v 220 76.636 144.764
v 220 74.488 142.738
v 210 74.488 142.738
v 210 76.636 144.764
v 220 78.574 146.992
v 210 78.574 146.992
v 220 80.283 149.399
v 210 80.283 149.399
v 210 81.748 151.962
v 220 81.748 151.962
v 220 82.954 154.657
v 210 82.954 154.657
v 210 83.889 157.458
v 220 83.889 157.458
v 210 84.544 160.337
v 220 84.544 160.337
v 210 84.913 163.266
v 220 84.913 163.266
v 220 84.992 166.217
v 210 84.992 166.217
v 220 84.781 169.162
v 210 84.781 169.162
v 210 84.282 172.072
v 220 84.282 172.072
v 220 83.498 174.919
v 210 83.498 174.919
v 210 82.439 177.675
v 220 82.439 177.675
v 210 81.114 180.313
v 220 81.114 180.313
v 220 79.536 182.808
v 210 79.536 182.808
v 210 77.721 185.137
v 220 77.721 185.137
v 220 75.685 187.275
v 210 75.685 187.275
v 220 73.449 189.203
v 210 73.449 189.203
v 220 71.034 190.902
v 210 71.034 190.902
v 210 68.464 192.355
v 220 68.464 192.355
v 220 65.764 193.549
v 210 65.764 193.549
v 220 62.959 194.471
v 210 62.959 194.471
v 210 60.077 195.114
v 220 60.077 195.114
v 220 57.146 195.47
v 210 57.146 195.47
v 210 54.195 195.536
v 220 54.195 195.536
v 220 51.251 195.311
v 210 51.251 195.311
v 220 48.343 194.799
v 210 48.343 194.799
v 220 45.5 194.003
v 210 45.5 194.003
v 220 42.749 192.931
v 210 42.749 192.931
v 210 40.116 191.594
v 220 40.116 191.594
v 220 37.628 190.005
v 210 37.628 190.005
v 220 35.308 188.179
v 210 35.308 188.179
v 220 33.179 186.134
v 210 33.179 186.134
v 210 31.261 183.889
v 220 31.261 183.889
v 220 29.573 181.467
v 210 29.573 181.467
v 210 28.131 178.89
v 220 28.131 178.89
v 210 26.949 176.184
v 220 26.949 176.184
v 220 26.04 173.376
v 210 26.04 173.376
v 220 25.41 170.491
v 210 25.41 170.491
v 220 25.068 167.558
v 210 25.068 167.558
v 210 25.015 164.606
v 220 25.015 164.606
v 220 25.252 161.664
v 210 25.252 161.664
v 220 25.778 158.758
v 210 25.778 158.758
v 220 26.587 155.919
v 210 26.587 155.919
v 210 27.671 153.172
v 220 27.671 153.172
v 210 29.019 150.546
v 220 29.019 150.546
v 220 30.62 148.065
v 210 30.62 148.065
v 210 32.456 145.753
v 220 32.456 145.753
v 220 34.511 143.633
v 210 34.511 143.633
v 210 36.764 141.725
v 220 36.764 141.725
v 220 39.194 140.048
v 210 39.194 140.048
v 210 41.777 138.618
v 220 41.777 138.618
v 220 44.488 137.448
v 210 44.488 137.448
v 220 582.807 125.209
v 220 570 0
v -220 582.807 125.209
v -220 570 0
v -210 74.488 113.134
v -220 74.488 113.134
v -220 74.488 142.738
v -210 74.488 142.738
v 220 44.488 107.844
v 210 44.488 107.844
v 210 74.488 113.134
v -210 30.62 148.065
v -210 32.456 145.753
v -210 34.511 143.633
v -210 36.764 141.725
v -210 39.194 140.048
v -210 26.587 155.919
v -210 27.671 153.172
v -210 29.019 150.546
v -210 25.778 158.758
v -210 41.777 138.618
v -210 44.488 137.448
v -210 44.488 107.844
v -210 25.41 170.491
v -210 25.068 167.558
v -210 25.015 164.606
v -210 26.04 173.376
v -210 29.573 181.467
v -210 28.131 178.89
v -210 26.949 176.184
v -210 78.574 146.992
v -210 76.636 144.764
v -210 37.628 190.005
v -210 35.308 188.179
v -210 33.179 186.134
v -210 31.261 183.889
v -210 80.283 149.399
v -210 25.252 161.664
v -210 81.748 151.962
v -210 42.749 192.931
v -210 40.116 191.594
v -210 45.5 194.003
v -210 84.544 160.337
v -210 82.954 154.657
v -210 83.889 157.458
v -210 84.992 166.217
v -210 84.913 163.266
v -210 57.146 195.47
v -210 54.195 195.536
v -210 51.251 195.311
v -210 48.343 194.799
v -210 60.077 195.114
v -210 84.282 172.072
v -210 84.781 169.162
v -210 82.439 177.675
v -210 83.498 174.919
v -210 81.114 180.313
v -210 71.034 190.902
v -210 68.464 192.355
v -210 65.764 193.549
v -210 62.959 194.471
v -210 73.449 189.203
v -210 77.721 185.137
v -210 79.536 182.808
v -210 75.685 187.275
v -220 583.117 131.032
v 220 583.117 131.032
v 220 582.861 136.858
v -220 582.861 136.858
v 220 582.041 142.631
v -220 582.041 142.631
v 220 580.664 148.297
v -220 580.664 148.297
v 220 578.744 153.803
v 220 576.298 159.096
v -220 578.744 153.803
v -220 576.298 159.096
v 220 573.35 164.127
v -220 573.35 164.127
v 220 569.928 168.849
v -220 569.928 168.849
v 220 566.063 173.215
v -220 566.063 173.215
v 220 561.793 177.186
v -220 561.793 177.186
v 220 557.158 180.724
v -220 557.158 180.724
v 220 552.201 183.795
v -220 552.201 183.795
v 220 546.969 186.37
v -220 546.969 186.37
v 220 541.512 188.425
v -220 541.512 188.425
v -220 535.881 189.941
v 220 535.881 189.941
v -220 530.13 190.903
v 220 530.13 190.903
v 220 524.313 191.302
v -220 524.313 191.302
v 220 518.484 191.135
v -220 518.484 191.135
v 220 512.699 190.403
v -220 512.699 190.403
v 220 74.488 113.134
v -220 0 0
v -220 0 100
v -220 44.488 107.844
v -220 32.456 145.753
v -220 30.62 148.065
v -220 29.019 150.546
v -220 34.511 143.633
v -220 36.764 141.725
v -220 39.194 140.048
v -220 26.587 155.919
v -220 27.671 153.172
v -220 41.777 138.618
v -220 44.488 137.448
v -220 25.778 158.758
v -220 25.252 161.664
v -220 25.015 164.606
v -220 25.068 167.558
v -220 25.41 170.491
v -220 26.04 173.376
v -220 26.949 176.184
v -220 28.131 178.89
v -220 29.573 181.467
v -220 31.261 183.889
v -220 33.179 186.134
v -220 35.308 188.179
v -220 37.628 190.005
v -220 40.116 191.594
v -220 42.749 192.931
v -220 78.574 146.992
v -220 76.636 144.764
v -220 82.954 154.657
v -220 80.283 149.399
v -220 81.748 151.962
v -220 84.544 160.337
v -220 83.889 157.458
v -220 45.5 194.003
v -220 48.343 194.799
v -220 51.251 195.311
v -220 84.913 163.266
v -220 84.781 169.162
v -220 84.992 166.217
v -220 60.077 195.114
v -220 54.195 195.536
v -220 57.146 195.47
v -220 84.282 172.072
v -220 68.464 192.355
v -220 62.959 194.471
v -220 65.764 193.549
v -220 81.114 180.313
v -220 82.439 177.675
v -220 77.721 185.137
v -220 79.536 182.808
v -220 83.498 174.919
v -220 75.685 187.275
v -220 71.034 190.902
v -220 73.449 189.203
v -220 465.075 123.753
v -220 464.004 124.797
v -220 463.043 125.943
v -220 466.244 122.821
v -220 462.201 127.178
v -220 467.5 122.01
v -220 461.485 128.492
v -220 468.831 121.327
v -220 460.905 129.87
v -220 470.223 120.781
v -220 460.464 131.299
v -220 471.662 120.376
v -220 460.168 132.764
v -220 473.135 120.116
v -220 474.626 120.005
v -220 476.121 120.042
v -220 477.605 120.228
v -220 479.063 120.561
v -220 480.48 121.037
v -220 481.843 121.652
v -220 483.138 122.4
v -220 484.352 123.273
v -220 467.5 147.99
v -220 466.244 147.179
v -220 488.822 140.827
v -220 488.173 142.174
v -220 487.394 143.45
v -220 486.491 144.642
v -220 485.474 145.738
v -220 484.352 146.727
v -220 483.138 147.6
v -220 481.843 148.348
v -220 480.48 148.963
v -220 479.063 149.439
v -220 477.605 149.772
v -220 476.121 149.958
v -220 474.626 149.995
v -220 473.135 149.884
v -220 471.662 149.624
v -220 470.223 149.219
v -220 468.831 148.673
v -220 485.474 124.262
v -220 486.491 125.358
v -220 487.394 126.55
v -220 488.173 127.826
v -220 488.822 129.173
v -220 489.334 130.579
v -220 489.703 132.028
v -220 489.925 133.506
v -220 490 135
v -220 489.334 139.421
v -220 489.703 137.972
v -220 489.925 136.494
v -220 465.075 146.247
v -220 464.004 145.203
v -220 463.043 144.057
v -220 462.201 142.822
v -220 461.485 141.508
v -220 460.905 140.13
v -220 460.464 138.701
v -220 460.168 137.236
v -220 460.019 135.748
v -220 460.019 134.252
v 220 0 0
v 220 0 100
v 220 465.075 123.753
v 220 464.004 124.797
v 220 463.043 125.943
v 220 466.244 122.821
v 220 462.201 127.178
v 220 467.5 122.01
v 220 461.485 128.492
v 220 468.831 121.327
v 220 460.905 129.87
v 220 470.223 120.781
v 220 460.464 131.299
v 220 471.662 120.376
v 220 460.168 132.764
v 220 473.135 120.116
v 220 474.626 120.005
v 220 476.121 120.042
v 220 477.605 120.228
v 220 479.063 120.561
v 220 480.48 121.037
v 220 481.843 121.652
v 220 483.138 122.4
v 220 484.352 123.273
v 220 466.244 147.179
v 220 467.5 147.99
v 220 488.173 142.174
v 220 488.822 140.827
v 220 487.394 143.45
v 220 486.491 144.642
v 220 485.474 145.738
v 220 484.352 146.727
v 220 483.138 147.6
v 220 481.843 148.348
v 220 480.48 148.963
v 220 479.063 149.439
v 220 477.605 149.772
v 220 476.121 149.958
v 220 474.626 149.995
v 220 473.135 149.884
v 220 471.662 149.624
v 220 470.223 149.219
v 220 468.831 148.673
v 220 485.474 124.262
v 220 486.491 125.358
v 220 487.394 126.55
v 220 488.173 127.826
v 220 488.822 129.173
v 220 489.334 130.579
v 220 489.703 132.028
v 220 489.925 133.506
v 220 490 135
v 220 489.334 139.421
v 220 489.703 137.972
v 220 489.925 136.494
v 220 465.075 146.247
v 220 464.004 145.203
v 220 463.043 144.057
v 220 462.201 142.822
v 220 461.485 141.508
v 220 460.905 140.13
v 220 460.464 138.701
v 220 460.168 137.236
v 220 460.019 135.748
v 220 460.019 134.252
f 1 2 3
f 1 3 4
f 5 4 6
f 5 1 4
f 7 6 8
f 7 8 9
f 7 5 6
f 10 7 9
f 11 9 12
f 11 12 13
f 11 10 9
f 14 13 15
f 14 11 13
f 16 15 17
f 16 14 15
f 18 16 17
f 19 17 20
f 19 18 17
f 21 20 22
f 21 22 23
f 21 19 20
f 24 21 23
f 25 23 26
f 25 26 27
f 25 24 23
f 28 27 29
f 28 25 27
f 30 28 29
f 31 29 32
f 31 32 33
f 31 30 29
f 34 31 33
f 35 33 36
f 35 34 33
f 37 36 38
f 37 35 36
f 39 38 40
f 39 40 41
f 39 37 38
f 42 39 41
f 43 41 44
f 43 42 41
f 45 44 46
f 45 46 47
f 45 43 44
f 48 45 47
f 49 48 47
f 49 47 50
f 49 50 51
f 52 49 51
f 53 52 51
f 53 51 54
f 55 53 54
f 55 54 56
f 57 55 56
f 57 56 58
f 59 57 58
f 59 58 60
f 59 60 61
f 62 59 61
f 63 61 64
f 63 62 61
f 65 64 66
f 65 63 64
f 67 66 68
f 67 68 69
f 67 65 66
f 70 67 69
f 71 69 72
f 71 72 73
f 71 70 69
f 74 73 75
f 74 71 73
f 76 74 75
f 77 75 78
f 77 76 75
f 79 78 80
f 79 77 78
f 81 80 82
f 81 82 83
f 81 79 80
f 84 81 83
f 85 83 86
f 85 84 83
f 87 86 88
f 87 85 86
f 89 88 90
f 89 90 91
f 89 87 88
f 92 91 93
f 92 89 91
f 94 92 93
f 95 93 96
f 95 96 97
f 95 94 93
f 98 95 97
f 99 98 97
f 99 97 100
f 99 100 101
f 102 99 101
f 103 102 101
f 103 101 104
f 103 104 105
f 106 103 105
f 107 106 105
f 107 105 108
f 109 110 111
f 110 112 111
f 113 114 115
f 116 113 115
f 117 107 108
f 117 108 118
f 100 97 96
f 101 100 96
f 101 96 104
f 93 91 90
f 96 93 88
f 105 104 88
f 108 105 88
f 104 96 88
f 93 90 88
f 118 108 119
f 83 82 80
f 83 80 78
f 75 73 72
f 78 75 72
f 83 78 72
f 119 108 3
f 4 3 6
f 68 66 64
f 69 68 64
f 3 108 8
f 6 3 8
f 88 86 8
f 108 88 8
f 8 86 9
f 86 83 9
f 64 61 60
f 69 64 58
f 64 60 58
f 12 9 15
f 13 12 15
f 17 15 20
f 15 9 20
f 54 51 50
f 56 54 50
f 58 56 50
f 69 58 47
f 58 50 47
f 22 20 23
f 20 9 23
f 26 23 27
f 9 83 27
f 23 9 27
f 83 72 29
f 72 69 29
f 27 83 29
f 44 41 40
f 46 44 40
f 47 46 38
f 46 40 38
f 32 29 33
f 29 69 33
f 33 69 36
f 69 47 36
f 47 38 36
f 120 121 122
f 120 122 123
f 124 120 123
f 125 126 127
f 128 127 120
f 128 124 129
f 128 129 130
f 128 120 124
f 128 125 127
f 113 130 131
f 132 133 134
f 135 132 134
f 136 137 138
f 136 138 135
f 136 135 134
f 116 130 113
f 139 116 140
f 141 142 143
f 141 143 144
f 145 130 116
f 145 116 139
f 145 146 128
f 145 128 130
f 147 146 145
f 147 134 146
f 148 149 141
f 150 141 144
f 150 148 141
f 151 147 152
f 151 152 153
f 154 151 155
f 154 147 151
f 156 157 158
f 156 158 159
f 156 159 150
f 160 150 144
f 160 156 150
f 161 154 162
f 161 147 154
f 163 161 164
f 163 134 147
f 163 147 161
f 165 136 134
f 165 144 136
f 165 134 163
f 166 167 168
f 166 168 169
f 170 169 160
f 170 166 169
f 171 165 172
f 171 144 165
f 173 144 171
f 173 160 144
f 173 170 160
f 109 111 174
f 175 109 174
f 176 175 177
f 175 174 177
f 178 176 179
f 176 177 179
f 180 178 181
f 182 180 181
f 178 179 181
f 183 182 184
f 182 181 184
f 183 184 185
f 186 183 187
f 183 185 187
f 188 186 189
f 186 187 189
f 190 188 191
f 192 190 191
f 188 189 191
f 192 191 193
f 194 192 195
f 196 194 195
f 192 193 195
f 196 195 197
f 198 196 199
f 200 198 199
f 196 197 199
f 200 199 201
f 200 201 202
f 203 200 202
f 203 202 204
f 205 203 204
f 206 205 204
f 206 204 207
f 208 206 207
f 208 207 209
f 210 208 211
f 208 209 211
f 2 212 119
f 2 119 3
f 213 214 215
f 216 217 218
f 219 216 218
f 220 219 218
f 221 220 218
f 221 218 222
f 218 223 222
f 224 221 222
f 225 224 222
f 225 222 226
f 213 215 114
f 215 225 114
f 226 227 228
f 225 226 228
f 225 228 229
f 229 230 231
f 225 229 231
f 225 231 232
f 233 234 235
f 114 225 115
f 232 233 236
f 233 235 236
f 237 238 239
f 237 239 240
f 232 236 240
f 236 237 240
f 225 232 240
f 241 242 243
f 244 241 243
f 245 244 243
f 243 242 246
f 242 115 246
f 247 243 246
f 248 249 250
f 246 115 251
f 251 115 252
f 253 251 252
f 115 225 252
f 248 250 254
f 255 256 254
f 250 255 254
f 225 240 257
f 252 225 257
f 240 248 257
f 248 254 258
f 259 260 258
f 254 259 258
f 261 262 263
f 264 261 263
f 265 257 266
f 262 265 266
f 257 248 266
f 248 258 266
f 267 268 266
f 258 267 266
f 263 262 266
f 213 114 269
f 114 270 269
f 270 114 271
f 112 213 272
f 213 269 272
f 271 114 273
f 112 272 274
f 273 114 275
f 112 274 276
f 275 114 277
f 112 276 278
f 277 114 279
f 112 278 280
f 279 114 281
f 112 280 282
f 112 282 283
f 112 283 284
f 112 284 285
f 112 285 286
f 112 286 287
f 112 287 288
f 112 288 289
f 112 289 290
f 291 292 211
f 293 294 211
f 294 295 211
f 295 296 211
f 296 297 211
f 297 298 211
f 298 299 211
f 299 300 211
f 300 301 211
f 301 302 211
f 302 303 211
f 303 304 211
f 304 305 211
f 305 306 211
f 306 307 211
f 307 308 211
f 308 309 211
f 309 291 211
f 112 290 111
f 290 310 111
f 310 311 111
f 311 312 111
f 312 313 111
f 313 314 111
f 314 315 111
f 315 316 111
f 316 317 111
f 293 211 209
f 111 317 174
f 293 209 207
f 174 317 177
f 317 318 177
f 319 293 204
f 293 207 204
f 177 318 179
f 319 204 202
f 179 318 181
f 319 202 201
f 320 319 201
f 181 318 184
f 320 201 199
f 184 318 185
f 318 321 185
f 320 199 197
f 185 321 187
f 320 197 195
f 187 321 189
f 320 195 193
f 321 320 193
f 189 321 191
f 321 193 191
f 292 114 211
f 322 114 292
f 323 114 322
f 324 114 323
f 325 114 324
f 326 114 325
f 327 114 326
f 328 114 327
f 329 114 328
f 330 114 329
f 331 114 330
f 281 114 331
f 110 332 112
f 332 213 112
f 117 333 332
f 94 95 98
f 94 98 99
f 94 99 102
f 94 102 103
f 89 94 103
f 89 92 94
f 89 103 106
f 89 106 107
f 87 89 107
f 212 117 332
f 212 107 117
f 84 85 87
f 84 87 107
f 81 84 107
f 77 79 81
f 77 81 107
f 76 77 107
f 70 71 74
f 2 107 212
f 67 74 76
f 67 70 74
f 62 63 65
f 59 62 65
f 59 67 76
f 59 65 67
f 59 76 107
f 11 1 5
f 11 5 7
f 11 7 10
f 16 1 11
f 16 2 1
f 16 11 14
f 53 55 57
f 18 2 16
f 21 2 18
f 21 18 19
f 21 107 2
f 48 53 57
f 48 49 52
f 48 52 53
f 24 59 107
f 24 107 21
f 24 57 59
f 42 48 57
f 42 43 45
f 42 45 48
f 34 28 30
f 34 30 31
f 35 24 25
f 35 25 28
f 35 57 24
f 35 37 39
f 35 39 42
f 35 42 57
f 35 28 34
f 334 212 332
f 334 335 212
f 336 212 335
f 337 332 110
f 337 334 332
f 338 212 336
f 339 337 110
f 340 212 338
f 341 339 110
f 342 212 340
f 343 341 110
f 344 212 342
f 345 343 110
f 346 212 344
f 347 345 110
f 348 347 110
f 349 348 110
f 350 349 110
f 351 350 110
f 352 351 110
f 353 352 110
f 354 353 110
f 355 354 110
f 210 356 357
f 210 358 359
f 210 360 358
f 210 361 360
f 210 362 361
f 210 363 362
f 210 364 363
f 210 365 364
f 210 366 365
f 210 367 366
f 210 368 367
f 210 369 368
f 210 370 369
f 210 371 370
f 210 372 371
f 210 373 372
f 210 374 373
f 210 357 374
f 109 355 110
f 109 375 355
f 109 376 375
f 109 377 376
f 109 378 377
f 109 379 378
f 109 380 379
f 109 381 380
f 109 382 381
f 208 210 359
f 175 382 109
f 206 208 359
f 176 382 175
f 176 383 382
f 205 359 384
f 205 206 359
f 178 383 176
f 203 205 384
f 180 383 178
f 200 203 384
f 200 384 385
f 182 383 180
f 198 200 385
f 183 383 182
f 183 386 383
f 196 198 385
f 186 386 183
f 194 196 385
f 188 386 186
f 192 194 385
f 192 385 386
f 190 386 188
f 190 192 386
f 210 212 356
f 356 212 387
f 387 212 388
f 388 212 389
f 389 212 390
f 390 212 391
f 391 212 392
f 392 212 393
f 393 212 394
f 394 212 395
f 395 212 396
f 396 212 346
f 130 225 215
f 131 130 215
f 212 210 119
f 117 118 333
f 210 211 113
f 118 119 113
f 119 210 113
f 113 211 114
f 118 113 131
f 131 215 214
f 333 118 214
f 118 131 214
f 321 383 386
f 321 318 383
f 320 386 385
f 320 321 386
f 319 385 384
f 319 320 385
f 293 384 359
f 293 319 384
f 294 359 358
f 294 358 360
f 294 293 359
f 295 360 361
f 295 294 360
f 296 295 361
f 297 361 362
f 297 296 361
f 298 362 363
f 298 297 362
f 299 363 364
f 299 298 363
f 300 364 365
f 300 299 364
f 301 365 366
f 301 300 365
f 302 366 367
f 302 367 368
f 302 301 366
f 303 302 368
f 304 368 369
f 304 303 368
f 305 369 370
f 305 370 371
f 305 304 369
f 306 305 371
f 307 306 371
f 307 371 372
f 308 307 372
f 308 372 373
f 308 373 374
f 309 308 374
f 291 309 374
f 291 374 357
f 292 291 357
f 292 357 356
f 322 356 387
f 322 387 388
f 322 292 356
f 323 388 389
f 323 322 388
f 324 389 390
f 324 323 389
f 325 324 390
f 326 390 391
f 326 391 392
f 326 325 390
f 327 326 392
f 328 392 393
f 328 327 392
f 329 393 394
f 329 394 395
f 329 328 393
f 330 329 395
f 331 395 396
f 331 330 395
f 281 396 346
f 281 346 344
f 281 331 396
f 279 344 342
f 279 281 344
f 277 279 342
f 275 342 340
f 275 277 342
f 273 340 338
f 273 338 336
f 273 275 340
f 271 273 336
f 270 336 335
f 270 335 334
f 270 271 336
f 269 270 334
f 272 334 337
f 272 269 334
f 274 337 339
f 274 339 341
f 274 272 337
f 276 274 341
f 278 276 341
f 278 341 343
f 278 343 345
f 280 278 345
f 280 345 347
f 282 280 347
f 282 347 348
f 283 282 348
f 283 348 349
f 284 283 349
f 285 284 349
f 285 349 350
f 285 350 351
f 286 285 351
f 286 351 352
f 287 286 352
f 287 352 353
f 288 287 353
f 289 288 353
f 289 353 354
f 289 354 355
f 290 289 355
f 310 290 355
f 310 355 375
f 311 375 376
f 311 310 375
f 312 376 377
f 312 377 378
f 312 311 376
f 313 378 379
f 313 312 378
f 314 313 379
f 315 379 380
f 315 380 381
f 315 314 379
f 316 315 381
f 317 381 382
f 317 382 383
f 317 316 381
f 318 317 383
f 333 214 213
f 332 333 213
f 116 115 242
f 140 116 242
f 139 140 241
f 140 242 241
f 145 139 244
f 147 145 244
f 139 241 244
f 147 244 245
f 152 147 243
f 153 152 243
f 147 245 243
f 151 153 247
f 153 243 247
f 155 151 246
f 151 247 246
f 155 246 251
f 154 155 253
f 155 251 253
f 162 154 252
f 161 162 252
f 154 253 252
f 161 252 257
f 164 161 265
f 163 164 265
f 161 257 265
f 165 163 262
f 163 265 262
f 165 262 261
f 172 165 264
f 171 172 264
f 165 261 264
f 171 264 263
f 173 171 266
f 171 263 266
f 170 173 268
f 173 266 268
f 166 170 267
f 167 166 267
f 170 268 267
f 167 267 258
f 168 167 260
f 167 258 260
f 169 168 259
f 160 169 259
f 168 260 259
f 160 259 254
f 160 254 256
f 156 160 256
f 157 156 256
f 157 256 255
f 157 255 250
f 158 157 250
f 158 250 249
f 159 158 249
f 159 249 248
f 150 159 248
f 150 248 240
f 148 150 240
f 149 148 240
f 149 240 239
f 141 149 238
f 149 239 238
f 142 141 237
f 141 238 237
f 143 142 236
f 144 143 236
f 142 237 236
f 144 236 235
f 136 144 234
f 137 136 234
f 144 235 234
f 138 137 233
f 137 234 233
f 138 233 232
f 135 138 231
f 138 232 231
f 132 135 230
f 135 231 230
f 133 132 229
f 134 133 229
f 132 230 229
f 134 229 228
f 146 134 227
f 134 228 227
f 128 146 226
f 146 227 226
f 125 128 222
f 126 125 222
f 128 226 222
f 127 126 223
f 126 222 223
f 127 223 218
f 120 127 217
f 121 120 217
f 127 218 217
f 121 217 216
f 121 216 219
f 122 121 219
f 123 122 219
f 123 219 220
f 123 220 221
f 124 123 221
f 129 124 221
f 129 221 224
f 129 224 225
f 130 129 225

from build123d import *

# Parameters (mm, degrees)
F0_R          = 15
F1_DEPTH      = 220
F1_DEPTH_BACK = 220
F3_DEPTH      = 10


with BuildPart() as f1:
    # F0 (on Right) → F1 (new body, two sides)
    with BuildSketch(Plane.YZ) as f1_sk:
        with BuildLine():
            Line((0, 100), (0, 0))
            Line((0, 0), (570, 0))
            Line((570, 0), (582.8065256566, 125.2091964617))
            ThreePointArc((582.8065256566, 125.2091964617), (563.9765046368, 175.2525352812), (512.6990361213, 190.4026730514))
            Line((512.6990361213, 190.4026730514), (0, 100))
        make_face()
        with Locations((475, 135)):
            Circle(F0_R, mode=Mode.SUBTRACT)
    extrude(amount=-F1_DEPTH)
    extrude(f1_sk.sketch, amount=F1_DEPTH_BACK)

    # F2 (on face) → F3 (join)
    with BuildSketch(Plane.YZ.offset(220)):
        with BuildLine():
            Line((44.4880730518, 137.4484157784), (44.4880730518, 107.8444475988))
            Line((44.4880730518, 107.8444475988), (74.4880730518, 113.13425702))
            Line((74.4880730518, 113.13425702), (74.4880730518, 142.7382251997))
            ThreePointArc((74.4880730518, 142.7382251997), (49.79055467, 195.090680183), (44.4880730518, 137.4484157784))
        make_face()
    extrude(amount=-F3_DEPTH)

    # F4: F1 across plane


with BuildPart() as f1_1:
    add(f1.part)
    add(f1.part.mirror(Plane.YZ))


solid = f1_1.part
